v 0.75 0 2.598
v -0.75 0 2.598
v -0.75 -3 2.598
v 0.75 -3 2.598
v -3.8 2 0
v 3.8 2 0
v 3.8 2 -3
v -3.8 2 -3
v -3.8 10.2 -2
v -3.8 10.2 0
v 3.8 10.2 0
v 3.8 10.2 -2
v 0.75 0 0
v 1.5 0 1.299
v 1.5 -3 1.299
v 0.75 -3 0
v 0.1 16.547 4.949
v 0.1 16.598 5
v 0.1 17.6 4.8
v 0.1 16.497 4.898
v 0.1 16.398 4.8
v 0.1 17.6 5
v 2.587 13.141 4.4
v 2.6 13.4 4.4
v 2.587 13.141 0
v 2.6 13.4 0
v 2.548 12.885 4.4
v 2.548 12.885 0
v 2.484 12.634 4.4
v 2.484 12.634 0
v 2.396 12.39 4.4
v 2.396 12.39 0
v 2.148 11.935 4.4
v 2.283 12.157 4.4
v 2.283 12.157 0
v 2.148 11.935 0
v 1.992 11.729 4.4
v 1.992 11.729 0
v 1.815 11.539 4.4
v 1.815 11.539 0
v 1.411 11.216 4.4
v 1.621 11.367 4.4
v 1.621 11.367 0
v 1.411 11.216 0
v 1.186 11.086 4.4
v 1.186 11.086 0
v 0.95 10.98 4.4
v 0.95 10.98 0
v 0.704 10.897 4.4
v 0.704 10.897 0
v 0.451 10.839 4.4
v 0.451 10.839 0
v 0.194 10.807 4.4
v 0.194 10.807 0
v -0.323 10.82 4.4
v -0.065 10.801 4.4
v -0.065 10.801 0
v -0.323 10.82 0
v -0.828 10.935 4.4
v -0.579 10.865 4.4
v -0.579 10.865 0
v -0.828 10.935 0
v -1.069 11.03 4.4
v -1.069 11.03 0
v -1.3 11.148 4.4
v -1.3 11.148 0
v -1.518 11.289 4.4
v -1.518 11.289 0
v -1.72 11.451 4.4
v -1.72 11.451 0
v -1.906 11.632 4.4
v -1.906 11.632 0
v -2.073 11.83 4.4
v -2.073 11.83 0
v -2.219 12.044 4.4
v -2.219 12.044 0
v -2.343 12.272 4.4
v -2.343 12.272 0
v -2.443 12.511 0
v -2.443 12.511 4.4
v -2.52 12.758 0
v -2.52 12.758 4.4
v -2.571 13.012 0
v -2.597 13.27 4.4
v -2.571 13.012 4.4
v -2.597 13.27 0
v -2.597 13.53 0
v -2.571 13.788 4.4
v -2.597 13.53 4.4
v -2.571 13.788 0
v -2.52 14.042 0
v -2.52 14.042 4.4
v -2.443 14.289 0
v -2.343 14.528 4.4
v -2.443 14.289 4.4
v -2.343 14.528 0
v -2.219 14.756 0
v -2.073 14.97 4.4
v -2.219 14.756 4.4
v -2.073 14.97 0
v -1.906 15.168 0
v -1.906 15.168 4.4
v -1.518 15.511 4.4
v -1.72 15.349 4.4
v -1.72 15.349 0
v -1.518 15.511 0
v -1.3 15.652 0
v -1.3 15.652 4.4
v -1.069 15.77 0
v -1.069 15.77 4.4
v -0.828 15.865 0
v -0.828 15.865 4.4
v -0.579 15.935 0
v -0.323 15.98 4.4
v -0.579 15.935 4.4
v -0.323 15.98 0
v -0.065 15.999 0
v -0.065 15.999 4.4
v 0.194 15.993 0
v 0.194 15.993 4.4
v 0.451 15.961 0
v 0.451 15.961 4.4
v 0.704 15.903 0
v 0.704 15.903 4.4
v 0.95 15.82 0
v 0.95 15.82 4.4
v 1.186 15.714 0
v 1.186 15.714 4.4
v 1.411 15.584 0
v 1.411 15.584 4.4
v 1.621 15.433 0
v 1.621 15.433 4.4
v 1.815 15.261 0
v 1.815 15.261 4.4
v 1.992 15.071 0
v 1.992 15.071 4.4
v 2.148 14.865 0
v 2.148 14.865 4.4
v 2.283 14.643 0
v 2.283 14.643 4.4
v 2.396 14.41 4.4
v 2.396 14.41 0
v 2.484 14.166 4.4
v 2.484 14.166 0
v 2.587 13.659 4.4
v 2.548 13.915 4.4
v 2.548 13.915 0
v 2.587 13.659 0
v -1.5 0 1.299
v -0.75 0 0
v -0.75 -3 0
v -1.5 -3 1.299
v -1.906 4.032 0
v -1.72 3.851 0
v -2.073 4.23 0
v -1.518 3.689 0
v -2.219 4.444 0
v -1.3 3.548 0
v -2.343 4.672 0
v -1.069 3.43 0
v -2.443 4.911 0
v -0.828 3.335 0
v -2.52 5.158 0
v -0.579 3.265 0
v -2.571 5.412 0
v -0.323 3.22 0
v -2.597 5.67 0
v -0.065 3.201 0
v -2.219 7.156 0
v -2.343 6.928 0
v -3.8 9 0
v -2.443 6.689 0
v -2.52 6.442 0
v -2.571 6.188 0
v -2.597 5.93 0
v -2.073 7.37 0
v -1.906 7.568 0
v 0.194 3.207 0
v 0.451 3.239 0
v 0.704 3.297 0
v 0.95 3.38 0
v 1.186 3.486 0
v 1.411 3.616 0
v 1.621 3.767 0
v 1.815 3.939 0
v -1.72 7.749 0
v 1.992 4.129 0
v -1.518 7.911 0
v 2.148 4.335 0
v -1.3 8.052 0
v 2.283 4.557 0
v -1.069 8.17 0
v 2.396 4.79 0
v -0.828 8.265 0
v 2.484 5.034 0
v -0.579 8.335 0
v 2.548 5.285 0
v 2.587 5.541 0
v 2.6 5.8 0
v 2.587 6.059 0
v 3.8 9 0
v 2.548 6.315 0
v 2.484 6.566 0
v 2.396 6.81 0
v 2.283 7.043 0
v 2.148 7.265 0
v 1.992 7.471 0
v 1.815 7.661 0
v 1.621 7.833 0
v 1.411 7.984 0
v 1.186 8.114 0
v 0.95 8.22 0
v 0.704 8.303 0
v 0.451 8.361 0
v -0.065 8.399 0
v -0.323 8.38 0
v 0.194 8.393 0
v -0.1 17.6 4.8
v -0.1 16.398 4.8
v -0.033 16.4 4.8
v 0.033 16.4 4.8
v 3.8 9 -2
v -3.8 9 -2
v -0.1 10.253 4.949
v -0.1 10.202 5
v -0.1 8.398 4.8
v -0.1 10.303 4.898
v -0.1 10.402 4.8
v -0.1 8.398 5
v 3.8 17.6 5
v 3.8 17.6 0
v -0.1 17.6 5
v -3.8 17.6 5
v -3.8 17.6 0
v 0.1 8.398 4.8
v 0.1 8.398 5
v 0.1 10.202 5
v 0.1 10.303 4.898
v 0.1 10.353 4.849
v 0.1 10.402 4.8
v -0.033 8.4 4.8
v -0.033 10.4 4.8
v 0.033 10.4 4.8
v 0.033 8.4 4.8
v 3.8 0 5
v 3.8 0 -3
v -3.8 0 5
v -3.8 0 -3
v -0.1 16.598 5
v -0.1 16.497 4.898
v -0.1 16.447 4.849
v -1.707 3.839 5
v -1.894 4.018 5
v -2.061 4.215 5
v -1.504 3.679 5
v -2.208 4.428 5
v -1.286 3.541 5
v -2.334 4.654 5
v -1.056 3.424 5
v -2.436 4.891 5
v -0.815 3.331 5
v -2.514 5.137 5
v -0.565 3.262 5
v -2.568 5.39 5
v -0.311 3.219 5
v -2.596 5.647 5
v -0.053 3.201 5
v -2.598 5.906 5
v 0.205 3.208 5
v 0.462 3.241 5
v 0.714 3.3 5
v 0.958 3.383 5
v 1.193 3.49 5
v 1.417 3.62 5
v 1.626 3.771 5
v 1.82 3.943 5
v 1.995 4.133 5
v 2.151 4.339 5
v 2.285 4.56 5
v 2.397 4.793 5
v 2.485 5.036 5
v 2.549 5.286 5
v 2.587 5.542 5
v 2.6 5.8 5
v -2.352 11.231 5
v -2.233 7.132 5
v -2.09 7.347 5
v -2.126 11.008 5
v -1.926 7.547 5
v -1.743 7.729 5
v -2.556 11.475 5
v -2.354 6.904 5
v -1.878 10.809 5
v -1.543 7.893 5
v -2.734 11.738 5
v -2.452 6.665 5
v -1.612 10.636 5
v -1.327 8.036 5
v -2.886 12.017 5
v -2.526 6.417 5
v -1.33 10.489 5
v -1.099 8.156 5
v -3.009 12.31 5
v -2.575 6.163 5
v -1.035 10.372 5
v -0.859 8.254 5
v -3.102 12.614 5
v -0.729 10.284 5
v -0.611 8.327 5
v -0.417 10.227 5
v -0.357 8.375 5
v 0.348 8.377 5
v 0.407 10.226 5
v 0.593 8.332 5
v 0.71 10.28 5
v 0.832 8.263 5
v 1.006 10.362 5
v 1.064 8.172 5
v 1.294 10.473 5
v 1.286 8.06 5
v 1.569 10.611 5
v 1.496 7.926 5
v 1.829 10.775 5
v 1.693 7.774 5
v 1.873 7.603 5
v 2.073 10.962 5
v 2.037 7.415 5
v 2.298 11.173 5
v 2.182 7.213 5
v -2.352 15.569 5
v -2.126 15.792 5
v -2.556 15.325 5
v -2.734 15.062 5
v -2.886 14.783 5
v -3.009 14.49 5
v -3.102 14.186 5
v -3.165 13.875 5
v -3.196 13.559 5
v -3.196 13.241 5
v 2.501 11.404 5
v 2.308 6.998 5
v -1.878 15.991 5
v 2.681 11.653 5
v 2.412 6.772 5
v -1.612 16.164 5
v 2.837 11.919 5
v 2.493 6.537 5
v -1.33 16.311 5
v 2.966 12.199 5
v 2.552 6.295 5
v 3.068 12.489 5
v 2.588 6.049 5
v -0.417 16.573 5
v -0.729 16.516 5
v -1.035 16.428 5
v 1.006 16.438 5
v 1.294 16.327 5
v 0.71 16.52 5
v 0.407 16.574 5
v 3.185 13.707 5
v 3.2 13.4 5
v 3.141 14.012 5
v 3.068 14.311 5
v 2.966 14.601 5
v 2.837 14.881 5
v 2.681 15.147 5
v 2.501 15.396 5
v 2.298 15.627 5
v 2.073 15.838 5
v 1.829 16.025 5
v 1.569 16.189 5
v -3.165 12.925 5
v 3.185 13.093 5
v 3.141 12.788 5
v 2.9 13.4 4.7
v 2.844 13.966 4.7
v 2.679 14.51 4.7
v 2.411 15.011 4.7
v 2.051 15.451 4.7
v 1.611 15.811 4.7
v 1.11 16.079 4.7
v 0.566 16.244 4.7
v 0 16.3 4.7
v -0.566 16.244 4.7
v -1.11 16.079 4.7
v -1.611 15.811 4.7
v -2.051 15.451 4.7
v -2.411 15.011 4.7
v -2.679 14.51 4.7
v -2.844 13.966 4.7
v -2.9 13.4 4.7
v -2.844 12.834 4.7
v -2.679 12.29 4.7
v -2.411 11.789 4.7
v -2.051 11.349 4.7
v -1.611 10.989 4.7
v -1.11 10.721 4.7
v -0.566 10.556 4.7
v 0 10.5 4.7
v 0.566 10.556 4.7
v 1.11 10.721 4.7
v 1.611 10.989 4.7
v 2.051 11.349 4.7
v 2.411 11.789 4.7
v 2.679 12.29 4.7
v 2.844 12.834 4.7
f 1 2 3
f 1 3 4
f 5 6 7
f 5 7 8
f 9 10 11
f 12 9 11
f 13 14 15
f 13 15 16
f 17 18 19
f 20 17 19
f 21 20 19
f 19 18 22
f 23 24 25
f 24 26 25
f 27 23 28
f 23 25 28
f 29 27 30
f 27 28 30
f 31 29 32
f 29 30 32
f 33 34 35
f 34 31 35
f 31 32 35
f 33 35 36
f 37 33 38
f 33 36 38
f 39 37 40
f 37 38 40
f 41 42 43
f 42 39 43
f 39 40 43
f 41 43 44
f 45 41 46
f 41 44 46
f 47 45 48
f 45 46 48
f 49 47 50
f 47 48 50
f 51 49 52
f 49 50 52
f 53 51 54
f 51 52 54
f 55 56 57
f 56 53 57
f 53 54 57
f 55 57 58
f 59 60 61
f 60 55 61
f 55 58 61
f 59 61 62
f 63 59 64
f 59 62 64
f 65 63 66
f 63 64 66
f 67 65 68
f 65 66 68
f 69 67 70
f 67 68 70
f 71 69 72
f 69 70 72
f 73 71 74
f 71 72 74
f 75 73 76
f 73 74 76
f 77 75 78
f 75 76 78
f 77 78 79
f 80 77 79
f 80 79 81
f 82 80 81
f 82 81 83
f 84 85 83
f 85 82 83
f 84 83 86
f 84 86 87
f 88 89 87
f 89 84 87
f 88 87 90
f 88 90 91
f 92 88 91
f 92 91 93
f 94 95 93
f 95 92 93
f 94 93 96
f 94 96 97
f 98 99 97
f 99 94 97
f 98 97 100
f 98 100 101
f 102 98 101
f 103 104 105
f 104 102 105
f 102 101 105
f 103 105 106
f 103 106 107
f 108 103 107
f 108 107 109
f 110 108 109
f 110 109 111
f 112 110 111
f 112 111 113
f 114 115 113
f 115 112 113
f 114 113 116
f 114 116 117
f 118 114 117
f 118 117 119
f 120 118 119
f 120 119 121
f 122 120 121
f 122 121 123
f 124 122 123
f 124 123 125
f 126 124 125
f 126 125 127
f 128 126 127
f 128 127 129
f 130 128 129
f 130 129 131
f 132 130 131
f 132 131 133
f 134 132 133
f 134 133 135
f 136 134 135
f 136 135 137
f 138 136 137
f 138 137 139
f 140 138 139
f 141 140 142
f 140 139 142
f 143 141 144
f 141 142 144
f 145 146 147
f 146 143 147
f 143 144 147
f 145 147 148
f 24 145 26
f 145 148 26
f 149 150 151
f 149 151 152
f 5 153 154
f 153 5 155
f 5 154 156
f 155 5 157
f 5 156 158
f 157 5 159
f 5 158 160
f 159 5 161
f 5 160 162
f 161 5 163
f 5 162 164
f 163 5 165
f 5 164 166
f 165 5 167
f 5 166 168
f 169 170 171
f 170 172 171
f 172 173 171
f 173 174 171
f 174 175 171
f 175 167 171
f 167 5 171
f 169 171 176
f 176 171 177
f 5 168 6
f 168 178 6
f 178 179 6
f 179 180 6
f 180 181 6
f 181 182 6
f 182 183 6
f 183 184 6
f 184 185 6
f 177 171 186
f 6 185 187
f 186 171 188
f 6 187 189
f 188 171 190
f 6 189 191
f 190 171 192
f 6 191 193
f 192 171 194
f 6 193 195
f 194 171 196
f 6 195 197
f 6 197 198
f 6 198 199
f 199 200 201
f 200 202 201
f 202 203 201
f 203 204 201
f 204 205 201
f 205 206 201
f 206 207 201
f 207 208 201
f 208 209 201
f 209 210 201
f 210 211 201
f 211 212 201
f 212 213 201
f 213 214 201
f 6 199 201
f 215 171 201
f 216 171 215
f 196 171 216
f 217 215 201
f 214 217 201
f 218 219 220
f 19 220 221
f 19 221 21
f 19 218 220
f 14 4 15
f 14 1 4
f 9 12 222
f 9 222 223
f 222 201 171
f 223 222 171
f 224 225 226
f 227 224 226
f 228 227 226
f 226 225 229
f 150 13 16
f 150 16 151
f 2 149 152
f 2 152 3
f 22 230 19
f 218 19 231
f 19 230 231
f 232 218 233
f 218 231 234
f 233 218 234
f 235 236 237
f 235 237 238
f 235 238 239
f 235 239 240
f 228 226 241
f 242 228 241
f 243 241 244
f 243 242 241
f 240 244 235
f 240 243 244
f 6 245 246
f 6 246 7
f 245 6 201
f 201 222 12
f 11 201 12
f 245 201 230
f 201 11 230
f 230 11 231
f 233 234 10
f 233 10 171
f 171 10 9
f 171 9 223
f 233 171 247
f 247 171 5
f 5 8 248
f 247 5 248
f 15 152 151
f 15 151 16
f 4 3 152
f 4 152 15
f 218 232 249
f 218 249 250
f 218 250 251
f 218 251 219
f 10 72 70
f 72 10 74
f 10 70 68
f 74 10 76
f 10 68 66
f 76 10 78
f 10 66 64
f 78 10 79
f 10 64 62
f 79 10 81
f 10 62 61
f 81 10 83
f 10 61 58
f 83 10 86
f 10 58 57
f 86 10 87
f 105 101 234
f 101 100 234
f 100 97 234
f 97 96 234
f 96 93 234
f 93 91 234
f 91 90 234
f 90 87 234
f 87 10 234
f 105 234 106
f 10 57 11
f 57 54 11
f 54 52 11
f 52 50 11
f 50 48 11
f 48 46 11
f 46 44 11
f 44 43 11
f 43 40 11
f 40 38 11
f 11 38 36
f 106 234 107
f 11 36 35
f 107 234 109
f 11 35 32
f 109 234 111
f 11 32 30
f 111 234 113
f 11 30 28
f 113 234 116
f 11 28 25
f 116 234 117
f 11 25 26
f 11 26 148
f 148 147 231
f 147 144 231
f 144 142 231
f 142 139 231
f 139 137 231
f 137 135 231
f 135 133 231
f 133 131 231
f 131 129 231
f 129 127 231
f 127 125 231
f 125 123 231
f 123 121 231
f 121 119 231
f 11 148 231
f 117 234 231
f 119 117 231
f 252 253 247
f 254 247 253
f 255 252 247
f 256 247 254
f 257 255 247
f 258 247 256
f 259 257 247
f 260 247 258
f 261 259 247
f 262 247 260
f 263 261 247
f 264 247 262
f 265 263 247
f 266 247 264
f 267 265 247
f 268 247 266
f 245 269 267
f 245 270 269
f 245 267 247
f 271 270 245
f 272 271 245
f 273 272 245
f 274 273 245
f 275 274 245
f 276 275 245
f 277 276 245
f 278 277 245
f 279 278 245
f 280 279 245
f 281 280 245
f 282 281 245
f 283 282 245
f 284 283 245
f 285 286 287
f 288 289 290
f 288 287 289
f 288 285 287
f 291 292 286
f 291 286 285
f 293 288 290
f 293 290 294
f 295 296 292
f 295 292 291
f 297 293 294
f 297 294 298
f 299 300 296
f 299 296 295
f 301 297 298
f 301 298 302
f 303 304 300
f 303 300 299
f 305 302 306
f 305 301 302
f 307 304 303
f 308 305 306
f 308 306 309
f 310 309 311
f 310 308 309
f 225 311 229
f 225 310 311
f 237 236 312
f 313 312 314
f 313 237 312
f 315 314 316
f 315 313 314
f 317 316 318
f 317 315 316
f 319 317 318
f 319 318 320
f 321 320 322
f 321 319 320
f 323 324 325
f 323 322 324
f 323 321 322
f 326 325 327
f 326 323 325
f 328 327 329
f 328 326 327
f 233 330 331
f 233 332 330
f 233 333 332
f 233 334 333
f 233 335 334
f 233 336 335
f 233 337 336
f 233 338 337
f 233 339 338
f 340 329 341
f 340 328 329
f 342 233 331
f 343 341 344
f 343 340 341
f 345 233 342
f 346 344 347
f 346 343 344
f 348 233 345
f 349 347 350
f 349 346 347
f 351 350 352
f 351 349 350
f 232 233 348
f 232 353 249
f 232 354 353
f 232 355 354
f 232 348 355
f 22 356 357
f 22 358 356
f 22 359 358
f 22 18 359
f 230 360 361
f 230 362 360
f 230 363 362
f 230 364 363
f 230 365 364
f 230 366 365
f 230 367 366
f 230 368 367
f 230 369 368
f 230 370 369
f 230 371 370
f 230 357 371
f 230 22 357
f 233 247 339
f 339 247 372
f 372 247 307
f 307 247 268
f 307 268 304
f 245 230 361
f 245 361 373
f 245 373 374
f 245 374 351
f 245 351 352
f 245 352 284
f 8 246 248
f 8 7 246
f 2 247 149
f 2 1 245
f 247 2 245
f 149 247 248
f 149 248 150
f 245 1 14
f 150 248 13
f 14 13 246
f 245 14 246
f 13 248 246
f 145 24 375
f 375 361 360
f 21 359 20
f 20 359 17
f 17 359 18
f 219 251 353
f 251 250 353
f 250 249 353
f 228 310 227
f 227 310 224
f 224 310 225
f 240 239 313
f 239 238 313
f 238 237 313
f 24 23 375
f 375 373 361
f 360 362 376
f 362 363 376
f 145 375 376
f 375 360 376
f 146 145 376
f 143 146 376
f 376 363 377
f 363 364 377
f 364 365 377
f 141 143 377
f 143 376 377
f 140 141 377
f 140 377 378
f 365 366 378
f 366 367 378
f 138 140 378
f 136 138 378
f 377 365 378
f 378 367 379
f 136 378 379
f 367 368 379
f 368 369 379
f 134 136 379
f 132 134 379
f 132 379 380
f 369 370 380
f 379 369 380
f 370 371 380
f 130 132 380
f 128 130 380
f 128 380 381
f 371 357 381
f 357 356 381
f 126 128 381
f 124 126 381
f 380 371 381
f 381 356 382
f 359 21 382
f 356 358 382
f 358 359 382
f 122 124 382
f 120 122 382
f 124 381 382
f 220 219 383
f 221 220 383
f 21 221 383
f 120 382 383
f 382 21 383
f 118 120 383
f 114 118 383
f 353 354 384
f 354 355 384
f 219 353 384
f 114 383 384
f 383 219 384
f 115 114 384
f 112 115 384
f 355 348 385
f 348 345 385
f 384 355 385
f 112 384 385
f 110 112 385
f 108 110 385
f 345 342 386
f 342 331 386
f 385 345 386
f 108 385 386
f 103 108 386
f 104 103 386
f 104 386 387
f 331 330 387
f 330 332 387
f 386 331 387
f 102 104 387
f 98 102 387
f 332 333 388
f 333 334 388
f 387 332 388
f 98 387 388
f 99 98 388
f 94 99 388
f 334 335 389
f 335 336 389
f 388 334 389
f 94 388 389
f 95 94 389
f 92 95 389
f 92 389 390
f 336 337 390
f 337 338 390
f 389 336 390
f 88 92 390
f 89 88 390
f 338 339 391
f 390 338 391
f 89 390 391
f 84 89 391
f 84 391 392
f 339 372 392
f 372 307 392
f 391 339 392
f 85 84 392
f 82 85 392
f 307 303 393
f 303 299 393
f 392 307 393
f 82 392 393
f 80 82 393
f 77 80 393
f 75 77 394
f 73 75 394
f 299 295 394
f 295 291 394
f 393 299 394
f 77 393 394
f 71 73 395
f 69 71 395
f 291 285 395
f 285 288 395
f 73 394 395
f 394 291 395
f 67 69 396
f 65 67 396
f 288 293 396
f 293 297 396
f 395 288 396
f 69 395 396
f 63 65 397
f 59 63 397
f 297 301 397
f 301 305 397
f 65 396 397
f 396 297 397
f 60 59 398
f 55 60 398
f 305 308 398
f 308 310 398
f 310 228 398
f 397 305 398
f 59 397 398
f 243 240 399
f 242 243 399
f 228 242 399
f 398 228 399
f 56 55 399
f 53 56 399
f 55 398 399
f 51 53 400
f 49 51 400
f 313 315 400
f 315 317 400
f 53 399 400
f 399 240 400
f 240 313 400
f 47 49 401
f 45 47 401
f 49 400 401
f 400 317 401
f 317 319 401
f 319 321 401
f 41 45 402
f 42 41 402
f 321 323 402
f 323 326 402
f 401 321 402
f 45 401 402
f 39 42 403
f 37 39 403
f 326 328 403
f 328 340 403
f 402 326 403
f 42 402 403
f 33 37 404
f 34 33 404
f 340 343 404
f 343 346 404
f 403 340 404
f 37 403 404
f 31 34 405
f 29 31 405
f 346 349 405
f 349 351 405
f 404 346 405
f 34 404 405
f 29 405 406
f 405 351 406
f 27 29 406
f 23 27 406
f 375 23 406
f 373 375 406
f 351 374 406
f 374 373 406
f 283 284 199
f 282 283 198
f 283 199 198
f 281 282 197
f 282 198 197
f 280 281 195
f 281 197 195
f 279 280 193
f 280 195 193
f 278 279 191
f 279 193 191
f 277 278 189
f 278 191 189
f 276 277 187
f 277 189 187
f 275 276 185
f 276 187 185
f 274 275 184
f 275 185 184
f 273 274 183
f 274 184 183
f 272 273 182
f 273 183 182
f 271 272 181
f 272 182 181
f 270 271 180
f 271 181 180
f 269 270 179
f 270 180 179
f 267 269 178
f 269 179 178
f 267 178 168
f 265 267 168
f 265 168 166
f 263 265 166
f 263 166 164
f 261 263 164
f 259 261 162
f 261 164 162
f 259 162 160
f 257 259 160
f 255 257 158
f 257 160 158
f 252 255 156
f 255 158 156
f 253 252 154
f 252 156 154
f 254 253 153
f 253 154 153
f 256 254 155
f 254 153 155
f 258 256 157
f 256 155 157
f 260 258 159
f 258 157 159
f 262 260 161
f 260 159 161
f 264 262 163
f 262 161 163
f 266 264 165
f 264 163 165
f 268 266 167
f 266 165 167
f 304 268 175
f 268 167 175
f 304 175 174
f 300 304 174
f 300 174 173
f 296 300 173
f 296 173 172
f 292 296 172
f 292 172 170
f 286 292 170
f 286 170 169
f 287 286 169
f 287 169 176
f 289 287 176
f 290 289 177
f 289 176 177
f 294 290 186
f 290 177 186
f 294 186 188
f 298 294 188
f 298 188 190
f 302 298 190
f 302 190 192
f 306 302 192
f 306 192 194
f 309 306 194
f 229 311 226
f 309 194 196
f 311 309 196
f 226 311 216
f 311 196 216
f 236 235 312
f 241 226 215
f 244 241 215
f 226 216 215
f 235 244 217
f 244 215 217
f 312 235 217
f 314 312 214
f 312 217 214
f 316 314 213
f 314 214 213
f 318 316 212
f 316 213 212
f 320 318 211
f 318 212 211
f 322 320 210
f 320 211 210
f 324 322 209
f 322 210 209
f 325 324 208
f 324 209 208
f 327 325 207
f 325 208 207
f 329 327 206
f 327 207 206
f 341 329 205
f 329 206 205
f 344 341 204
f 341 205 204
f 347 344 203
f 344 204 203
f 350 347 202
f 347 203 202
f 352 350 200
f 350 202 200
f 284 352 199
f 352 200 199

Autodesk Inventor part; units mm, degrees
ref_plane "YZ Plane" through (0, 0, 0) normal (1, 0, 0) x (0, 1, 0)
ref_plane "XZ Plane" through (0, 0, 0) normal (0, 1, 0) x (-1, 0, 0)
ref_plane "XY Plane" through (0, 0, 0) normal (0, 0, 1) x (1, 0, 0)
sketch "スケッチ1" plane through (0, 0, 0) normal (0, 0, 1) x (1, 0, 0)
  circle A0 centre (0, 5.8) radius 2.6
  circle A1 centre (0, 13.4) radius 2.6
  line L0 (-3.8, 0) -> (3.8, 0)
  line L1 (3.8, 0) -> (3.8, 17.6)
  line L2 (3.8, 17.6) -> (-3.8, 17.6)
  line L3 (-3.8, 17.6) -> (-3.8, 0)
  line L4 (-11.5586, 9.6) -> (11.5586, 9.6) construction
  point P0 (0, 0)
  point P1 (0, 0)
  point P2 (0, 9.6)
  dimension "LED_DIA" = 5.2
  dimension "d1" = 7.6
  dimension "LED_PITCH" = 7.6
  dimension "TOP_MARGIN" = 4.2
  dimension "BOTTOM_MARGIN" = 5.8
extrude "スペーサ" add sketch "スケッチ1" along normal blind 5
sketch "スケッチ2" plane through (0, 0, 0) normal (0, 0, -1) x (-1, 0, 0)
  line L0 (3.8, 17.6) -> (3.8, 0) projected
  line L1 (-3.8, 0) -> (-3.8, 17.6) projected
  line L2 (3.8, 0) -> (-3.8, 0)
  line L3 (-3.8, 0) -> (-3.8, 2)
  line L4 (-3.8, 2) -> (3.8, 2)
  line L5 (3.8, 2) -> (3.8, 0)
  line L6 (3.8, 10.2) -> (-3.8, 10.2)
  line L7 (-3.8, 10.2) -> (-3.8, 9)
  line L8 (-3.8, 9) -> (3.8, 9)
  line L9 (3.8, 9) -> (3.8, 10.2)
  circle A0 centre (0, 5.8) radius 2.9 construction
  circle A1 centre (0, 13.4) radius 2.9 construction
  circle A2 centre (0, 5.8) radius 2.6 construction
  circle A3 centre (0, 13.4) radius 2.6 construction
  line L10 (6.2058, 13.4) -> (-6.2058, 13.4) construction
  line L11 (-6.2058, 5.8) -> (6.2058, 5.8) construction
  line L12 (6.2058, 9.6) -> (-6.2058, 9.6) construction
  point P0 (0, 0)
  point P1 (3.8, 9.6)
  point P2 (-3.8, 9)
  point P3 (3.8, 9)
  point P4 (3.8, 10.2)
  point P5 (-3.8, 10.2)
  dimension "d8" = 5.8
  dimension "d9" = 2
  dimension "d10" = 1.2
extrude "押し出し2" add sketch "スケッチ2" along normal blind 3 contours L0 L2 L1 L4
extrude "押し出し5" add sketch "スケッチ2" along normal blind 2 contours L0 L8 L1 L6
chamfer "面取り1" distance 0.6 angle 45 1 edges at (-2.6, 13.4, 5)
sketch "スケッチ4" plane through (-3.8, 0, 5) normal (0, -1, 0) x (1, 0, 0)
  line L0 (4.55, -5) -> (3.05, -5)
  line L1 (3.05, -5) -> (2.3, -3.701)
  line L2 (2.3, -3.701) -> (3.05, -2.4019)
  line L3 (3.05, -2.4019) -> (4.55, -2.4019)
  line L4 (4.55, -2.4019) -> (5.3, -3.701)
  line L5 (5.3, -3.701) -> (4.55, -5)
  line L6 (0, 0) -> (7.6, 0) projected
  point P0 (3.8, -5)
  point P1 (3.8, -3.701)
  dimension "d19" = 3
extrude "足" add sketch "スケッチ4" along normal blind 3
sketch "スケッチ5" plane through (0, 0, 5) normal (0, 0, 1) x (1, 0, 0)
  line L0 (-0.1, 5.8) -> (0.1, 5.8)
  line L1 (0.1, 5.8) -> (0.1, 17.6)
  line L2 (0.1, 17.6) -> (-0.1, 17.6)
  line L3 (-0.1, 17.6) -> (-0.1, 5.8)
  line L4 (-3.8, 0) -> (3.8, 0) projected
  line L5 (3.8, 17.6) -> (-3.8, 17.6) projected
  point P0 (0, 0)
  point P1 (0, 5.8)
  point P2 (0, 0)
  dimension "d24" = 0.2
extrude "押し出し6" cut sketch "スケッチ5" against normal blind 0.2
properties part number "LED-Spacer1"
